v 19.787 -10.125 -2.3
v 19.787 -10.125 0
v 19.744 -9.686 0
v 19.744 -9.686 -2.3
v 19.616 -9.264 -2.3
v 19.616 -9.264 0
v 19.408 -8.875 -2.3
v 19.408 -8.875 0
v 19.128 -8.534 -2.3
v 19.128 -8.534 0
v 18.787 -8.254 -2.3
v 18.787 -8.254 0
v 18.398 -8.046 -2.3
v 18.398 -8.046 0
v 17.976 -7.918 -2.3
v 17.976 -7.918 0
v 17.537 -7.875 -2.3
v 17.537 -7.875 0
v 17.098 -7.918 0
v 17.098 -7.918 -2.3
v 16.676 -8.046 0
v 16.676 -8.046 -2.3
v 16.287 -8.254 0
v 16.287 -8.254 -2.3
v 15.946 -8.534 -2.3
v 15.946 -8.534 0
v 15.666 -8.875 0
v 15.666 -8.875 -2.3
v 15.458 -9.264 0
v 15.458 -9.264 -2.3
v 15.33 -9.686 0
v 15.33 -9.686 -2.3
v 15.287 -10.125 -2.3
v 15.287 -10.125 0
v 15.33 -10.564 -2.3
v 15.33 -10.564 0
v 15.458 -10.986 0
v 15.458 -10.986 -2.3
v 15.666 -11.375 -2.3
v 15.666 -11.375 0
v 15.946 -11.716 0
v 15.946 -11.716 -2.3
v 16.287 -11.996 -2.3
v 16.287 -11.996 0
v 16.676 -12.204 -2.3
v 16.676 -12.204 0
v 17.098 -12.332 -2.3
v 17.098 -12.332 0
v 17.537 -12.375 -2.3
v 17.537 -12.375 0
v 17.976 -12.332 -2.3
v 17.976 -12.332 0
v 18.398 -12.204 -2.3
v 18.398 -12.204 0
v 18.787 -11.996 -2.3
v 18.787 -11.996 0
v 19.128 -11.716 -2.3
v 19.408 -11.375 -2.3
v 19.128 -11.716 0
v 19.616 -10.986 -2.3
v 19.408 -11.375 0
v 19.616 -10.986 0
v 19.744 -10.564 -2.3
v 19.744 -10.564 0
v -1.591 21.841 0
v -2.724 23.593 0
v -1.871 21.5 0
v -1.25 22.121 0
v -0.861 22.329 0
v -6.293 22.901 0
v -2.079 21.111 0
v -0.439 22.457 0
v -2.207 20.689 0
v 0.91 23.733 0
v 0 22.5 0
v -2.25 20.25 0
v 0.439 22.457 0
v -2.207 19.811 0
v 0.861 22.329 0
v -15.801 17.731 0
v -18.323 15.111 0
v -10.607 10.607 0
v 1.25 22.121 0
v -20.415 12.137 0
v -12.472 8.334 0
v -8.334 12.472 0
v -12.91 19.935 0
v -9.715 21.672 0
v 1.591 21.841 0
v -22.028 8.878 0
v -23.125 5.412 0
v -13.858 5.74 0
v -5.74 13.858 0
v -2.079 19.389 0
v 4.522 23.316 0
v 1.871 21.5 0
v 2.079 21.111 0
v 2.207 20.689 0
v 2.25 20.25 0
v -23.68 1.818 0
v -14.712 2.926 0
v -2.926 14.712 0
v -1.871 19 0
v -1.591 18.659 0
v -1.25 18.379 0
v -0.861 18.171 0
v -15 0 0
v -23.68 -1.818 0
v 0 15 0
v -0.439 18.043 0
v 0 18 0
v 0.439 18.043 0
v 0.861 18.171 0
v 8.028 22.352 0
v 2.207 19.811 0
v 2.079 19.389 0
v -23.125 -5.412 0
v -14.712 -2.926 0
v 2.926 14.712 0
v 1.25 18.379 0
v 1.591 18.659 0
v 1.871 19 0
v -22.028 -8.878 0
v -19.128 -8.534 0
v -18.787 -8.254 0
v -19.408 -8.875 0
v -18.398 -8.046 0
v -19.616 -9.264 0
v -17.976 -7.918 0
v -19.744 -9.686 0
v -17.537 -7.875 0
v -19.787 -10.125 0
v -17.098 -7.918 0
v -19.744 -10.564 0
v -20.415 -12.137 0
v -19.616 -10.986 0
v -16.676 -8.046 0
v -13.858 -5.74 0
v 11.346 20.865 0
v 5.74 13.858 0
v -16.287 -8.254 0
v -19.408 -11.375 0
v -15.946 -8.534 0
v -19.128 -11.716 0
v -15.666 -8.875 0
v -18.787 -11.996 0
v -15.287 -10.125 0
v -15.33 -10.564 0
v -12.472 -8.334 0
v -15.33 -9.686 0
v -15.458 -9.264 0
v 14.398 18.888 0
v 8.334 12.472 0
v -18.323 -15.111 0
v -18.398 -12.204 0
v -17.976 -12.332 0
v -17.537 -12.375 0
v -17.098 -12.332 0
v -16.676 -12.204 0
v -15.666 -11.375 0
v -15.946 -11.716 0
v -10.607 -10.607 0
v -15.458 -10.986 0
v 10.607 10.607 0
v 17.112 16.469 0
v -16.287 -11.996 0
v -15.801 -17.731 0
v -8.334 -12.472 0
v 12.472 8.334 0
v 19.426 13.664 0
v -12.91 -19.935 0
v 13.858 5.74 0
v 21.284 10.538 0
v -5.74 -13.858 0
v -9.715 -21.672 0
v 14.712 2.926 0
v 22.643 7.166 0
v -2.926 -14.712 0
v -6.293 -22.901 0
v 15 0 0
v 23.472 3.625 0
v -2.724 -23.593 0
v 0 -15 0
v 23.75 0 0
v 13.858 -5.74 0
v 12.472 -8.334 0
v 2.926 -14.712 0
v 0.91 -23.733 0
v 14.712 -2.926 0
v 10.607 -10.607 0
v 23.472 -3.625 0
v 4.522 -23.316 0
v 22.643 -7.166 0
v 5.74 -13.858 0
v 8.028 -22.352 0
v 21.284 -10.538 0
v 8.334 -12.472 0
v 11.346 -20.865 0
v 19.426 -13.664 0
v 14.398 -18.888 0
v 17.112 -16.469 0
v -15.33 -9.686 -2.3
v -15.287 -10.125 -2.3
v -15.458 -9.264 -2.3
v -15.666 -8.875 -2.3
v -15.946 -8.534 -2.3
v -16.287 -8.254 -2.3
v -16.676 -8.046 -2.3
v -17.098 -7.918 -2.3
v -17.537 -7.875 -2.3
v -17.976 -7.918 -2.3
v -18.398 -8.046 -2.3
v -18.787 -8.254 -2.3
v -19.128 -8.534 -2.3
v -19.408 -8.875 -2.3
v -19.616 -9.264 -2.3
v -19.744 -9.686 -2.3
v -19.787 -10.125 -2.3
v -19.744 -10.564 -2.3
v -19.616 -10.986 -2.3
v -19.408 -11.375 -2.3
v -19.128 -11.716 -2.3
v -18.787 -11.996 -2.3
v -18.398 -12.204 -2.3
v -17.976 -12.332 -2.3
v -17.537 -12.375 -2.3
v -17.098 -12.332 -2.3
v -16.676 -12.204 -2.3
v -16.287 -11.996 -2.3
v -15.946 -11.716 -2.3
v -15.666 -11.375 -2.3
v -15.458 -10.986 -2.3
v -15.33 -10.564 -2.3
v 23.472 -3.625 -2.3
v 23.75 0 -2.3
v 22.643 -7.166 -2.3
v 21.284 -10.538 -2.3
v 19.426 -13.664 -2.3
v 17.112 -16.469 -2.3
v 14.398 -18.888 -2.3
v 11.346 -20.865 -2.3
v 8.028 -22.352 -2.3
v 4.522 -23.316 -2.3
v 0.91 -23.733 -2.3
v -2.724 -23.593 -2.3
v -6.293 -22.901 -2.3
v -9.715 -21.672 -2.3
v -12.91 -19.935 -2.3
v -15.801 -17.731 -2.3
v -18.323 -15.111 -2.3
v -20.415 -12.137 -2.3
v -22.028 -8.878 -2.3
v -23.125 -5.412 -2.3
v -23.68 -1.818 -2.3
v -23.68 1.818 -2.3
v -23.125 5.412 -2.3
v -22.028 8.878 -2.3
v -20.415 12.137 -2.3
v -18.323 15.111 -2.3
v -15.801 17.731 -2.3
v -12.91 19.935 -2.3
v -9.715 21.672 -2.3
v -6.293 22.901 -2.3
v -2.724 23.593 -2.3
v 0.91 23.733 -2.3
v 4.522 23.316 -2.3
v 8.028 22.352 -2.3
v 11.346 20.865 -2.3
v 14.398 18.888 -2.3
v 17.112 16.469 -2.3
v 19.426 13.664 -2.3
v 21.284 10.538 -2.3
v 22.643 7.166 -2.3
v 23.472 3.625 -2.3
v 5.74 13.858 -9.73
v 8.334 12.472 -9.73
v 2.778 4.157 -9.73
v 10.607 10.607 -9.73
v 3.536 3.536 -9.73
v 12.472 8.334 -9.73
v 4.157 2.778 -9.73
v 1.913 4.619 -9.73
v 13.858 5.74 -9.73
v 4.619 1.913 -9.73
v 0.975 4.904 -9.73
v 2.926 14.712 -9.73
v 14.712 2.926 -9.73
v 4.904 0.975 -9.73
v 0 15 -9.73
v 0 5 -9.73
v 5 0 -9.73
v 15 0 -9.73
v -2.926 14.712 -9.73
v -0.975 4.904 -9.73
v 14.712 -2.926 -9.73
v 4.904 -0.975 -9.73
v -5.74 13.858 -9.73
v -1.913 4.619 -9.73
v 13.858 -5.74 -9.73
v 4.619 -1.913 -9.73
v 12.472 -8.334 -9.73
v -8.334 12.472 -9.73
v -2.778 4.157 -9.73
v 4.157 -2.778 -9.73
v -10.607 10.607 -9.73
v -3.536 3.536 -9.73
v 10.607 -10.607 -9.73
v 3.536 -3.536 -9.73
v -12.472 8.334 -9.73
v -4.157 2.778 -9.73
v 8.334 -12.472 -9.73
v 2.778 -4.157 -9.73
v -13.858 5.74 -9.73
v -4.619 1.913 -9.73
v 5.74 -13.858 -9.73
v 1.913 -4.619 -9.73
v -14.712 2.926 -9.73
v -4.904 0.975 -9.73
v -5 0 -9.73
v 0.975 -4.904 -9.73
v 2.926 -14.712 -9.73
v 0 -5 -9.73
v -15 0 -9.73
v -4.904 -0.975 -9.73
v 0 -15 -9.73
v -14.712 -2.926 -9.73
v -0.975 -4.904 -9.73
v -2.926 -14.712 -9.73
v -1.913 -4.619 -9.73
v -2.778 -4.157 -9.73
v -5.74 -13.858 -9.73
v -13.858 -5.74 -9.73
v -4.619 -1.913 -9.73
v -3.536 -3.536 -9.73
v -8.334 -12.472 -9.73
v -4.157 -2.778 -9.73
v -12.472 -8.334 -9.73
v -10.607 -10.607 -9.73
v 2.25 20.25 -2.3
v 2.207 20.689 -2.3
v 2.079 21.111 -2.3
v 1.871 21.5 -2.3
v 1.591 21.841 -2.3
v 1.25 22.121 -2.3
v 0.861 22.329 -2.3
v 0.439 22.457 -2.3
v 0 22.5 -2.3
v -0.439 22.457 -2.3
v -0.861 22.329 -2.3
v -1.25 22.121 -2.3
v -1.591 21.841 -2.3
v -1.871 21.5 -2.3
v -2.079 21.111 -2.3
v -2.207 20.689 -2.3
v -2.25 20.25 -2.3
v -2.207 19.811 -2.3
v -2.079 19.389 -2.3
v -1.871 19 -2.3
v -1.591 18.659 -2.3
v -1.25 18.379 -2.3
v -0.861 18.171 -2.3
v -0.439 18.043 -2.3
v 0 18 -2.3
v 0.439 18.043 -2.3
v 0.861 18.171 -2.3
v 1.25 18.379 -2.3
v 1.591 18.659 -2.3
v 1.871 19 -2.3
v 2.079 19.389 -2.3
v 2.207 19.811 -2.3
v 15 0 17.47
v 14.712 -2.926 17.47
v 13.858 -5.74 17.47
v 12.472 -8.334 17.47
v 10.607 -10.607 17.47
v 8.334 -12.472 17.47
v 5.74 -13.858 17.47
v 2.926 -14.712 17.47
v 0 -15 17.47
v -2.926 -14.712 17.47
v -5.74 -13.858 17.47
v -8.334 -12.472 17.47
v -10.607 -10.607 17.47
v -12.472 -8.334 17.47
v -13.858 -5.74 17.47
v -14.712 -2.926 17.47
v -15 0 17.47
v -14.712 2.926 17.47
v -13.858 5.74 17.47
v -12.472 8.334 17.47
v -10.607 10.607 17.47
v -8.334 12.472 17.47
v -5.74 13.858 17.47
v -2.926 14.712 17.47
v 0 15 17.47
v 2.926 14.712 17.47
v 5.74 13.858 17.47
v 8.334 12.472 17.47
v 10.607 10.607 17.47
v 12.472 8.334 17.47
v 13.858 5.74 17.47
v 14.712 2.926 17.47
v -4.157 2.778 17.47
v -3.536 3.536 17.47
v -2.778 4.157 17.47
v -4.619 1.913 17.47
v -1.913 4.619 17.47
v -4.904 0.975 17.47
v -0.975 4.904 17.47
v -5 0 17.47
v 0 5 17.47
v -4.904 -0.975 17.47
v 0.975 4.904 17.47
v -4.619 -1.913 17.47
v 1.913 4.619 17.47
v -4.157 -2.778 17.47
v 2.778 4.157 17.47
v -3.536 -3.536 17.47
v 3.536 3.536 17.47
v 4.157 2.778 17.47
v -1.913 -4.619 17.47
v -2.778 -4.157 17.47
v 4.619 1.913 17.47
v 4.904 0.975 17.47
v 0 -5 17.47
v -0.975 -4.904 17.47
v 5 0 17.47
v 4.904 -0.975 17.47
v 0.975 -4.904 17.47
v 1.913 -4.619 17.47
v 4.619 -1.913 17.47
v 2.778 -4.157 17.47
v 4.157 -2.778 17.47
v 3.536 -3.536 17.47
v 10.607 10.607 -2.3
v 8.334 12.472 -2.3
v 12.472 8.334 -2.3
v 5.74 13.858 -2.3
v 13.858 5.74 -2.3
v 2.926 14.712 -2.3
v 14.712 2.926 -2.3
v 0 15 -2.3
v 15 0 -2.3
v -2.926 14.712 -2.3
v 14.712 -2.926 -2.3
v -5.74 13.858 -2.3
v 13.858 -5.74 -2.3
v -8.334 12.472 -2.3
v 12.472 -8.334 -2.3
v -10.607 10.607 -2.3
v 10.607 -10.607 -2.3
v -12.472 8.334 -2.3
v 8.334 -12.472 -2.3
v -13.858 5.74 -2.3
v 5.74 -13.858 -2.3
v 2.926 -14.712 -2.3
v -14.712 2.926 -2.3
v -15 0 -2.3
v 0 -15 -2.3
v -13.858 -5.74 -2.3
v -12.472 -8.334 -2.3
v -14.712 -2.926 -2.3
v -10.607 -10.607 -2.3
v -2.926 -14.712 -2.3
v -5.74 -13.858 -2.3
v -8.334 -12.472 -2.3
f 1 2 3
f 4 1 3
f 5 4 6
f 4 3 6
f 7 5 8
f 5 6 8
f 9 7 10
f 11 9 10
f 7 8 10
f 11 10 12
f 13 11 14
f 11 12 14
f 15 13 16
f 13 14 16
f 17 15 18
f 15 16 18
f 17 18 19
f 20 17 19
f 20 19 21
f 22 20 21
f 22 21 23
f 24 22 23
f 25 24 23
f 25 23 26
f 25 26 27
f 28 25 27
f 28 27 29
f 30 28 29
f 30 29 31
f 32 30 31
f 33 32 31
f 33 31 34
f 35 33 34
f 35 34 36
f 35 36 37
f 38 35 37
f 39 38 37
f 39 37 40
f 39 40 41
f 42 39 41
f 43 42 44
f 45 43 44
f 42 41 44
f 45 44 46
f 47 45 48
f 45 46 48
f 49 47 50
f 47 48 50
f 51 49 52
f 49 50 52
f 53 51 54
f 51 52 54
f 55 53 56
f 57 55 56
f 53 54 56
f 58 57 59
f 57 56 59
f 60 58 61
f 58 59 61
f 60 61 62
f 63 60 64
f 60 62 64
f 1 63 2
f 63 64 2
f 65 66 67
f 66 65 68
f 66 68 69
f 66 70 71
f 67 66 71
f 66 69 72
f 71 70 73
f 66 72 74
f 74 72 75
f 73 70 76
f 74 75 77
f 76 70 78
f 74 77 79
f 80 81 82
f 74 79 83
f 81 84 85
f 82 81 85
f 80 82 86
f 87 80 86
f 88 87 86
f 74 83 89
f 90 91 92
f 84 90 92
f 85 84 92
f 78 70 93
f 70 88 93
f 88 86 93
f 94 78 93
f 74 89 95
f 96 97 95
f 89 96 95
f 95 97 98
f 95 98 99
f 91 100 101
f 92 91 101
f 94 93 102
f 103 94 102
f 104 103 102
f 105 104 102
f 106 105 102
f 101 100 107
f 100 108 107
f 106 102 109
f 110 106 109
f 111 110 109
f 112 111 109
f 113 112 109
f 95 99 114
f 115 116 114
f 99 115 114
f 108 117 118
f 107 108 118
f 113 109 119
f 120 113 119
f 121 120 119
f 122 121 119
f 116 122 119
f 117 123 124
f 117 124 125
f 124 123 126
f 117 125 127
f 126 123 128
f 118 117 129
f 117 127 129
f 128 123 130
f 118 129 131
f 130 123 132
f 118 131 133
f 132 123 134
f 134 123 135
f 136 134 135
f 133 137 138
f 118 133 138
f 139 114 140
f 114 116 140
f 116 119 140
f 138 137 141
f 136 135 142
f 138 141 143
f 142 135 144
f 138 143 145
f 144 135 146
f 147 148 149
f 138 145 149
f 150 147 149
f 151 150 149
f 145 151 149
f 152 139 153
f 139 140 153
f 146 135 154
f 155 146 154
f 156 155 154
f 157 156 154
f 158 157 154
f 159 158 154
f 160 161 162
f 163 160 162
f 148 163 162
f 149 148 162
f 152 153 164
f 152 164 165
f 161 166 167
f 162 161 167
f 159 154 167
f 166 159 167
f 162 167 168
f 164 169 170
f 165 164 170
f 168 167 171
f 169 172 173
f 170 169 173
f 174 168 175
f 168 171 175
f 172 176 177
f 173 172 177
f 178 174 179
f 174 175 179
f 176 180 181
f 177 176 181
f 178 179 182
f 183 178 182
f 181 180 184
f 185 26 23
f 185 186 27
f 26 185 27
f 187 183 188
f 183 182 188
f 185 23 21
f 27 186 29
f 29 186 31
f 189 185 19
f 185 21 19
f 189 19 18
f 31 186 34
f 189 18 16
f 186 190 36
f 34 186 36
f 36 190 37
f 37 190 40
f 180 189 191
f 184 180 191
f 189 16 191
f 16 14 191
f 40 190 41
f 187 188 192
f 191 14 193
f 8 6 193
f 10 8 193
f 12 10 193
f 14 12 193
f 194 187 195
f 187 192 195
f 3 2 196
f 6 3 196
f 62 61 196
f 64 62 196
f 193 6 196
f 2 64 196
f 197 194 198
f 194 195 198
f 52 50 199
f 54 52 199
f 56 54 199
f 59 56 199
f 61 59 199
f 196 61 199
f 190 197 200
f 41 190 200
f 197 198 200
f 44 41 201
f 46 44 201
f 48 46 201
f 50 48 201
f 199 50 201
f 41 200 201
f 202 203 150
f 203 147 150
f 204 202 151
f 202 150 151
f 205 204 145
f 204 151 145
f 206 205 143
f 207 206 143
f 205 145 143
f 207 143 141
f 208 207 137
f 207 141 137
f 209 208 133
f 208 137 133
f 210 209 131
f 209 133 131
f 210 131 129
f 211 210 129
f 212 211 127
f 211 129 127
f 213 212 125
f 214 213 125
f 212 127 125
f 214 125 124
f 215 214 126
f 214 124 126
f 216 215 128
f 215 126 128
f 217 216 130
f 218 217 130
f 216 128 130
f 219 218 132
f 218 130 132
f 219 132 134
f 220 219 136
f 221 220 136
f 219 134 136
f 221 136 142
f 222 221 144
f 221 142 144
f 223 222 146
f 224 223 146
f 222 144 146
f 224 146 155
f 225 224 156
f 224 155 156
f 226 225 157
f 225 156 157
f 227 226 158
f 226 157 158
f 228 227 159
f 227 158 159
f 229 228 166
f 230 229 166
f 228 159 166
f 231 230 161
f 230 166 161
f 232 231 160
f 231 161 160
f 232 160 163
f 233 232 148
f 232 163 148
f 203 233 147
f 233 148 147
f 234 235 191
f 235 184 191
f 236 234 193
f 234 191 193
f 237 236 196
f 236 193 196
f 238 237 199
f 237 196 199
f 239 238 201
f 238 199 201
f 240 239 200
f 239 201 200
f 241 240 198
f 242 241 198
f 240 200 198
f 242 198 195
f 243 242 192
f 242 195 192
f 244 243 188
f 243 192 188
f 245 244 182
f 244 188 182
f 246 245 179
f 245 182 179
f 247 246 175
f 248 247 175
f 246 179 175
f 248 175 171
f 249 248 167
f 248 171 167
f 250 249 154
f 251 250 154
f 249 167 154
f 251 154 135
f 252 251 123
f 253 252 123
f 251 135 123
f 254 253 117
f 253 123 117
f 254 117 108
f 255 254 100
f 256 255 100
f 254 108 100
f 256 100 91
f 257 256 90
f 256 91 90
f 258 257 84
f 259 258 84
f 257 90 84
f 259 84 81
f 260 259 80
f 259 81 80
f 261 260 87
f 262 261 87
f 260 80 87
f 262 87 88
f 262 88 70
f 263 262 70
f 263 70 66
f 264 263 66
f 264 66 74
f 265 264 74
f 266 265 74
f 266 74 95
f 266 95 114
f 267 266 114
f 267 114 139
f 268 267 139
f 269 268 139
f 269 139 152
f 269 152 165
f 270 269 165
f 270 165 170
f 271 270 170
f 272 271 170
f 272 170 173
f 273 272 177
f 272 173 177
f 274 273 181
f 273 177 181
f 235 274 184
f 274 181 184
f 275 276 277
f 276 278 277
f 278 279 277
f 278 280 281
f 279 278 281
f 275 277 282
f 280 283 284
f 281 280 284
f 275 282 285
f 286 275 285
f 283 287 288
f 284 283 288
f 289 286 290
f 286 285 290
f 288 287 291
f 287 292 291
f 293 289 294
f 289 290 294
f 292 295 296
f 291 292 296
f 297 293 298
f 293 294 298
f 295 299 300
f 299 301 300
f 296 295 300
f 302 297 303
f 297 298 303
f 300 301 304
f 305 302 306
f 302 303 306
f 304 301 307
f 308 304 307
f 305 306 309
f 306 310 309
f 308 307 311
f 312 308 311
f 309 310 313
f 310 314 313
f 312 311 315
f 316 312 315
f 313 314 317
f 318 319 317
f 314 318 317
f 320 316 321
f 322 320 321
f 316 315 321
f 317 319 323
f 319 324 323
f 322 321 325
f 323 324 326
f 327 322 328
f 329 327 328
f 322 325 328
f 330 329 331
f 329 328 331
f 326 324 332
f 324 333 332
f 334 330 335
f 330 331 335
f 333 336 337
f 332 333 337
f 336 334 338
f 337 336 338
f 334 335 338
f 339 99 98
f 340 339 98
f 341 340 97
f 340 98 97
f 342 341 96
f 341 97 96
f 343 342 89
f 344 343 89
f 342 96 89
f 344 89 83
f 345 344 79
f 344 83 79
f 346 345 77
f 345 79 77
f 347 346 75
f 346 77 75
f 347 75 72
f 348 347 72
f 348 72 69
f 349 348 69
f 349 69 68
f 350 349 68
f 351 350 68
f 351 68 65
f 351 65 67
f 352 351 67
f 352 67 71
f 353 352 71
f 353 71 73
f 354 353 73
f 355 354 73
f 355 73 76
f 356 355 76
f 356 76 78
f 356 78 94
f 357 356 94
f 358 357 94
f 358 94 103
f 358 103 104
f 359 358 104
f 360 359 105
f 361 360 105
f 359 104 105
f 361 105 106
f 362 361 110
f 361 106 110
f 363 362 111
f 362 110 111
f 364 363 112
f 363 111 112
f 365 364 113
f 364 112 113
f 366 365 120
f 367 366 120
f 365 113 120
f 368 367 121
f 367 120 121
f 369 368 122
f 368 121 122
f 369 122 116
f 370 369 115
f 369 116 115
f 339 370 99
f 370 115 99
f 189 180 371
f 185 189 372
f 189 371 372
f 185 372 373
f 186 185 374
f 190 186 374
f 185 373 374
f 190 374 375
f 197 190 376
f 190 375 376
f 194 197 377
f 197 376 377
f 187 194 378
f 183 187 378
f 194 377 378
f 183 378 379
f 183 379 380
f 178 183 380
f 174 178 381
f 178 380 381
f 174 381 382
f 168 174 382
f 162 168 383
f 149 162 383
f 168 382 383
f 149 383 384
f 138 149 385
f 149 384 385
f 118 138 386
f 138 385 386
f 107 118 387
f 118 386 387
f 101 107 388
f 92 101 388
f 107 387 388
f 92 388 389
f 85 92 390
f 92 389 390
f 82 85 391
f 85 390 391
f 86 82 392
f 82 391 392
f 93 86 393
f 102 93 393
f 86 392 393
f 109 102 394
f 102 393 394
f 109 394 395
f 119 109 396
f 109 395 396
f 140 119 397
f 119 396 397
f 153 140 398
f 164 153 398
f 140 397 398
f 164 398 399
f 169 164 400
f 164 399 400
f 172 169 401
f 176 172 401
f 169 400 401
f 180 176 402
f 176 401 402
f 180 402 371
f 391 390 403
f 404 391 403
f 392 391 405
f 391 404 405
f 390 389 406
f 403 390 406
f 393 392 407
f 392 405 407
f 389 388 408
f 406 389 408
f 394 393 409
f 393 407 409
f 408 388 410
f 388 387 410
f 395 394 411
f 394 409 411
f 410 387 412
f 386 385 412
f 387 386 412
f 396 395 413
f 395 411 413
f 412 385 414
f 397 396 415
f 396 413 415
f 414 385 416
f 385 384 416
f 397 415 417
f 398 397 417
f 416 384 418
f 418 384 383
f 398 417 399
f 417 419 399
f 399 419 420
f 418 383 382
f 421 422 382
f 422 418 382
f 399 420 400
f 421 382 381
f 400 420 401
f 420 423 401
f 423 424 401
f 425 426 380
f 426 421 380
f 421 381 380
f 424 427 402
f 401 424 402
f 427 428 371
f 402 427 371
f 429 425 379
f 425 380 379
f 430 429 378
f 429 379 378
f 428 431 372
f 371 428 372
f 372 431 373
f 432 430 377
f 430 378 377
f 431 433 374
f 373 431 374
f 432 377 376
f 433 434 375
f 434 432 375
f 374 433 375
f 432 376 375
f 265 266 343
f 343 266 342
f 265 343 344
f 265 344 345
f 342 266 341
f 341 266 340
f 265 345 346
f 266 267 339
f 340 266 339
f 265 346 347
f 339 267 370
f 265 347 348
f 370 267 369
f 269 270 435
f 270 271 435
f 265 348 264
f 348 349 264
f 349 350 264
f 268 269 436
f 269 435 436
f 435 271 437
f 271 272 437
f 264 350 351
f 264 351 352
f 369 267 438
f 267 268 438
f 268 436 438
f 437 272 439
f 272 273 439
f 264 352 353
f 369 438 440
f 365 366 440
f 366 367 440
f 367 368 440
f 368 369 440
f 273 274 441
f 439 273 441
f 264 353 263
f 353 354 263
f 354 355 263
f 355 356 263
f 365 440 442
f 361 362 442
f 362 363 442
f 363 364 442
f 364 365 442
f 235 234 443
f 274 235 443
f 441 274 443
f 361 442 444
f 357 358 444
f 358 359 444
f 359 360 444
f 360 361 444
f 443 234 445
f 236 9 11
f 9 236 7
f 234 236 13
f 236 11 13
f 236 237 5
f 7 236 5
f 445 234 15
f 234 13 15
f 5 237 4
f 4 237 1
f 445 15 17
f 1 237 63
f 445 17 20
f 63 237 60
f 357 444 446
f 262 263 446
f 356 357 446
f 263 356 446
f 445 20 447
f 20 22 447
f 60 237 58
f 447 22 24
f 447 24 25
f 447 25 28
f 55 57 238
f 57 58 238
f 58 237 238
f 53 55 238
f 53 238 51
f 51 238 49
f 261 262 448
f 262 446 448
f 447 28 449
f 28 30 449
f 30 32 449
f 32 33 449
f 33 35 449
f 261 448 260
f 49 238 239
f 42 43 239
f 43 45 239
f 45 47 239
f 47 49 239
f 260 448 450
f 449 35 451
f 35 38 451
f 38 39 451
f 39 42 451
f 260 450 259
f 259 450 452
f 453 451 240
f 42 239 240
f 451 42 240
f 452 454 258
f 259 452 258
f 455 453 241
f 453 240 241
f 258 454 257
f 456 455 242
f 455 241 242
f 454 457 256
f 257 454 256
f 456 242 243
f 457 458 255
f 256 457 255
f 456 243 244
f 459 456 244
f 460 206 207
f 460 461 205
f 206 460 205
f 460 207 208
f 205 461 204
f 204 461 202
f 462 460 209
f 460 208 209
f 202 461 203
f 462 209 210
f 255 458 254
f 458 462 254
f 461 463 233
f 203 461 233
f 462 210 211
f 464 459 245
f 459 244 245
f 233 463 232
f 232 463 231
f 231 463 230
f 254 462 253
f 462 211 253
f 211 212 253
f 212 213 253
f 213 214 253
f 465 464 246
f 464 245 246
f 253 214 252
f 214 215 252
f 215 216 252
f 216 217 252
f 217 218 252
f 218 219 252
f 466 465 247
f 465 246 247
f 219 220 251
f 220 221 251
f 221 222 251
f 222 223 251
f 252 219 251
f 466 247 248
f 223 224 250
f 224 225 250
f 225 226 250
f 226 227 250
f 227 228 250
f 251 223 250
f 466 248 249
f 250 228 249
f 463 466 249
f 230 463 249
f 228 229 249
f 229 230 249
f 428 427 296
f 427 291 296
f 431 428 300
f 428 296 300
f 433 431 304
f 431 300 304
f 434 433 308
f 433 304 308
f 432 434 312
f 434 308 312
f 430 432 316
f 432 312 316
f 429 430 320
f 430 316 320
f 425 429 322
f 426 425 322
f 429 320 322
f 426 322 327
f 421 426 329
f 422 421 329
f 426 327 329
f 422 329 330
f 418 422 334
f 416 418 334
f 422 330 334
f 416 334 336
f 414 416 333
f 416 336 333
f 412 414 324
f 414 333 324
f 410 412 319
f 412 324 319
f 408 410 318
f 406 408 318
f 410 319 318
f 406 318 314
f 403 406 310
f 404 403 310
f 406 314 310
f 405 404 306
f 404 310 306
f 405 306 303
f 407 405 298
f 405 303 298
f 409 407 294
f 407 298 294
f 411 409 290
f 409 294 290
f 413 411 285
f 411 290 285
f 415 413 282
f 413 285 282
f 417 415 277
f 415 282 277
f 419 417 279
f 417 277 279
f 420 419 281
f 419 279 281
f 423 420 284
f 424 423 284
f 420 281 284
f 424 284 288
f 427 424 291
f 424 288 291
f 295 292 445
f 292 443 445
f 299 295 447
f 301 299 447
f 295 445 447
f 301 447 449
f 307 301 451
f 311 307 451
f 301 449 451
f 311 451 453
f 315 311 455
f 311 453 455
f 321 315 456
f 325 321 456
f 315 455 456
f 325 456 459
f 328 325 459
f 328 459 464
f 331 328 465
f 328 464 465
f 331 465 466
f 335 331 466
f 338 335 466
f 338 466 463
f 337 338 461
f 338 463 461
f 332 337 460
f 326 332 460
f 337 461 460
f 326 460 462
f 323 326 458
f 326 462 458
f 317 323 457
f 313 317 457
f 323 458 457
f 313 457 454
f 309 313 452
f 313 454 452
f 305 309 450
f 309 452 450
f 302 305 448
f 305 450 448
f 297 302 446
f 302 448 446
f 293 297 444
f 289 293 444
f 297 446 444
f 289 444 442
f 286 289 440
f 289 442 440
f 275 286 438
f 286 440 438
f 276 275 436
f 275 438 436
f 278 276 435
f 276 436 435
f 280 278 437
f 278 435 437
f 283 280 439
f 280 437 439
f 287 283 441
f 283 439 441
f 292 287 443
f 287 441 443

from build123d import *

# Parameters (mm, degrees)
SKETCH3_R          = 2.25
CUT_EXTRUDE1_DEPTH = 5


with BuildPart() as part:
    # Sketch2 → Revolve1 (revolve)
    with BuildSketch(Plane(origin=(0, 0, 0), x_dir=(1, 0, 0), z_dir=(0, 1, 0))):
        Polygon((5, -17.47), (5, 9.73), (15, 9.73), (15, 2.3), (23.75, 2.3), (23.75, 0), (15, 0), (15, -17.47), align=None)
    revolve(axis=Axis((0, 0, 39.284955752), (0, 0, -1)))

    # Sketch3 → Cut-Extrude1 (cut, symmetric)
    with BuildSketch(Plane.XY):
        with Locations((0, 20.25)):
            Circle(SKETCH3_R)
        with Locations((17.537014427, -10.125)):
            Circle(SKETCH3_R)
        with Locations((-17.537014427, -10.125)):
            Circle(SKETCH3_R)
    extrude(amount=CUT_EXTRUDE1_DEPTH, both=True, mode=Mode.SUBTRACT)


solid = part.part
